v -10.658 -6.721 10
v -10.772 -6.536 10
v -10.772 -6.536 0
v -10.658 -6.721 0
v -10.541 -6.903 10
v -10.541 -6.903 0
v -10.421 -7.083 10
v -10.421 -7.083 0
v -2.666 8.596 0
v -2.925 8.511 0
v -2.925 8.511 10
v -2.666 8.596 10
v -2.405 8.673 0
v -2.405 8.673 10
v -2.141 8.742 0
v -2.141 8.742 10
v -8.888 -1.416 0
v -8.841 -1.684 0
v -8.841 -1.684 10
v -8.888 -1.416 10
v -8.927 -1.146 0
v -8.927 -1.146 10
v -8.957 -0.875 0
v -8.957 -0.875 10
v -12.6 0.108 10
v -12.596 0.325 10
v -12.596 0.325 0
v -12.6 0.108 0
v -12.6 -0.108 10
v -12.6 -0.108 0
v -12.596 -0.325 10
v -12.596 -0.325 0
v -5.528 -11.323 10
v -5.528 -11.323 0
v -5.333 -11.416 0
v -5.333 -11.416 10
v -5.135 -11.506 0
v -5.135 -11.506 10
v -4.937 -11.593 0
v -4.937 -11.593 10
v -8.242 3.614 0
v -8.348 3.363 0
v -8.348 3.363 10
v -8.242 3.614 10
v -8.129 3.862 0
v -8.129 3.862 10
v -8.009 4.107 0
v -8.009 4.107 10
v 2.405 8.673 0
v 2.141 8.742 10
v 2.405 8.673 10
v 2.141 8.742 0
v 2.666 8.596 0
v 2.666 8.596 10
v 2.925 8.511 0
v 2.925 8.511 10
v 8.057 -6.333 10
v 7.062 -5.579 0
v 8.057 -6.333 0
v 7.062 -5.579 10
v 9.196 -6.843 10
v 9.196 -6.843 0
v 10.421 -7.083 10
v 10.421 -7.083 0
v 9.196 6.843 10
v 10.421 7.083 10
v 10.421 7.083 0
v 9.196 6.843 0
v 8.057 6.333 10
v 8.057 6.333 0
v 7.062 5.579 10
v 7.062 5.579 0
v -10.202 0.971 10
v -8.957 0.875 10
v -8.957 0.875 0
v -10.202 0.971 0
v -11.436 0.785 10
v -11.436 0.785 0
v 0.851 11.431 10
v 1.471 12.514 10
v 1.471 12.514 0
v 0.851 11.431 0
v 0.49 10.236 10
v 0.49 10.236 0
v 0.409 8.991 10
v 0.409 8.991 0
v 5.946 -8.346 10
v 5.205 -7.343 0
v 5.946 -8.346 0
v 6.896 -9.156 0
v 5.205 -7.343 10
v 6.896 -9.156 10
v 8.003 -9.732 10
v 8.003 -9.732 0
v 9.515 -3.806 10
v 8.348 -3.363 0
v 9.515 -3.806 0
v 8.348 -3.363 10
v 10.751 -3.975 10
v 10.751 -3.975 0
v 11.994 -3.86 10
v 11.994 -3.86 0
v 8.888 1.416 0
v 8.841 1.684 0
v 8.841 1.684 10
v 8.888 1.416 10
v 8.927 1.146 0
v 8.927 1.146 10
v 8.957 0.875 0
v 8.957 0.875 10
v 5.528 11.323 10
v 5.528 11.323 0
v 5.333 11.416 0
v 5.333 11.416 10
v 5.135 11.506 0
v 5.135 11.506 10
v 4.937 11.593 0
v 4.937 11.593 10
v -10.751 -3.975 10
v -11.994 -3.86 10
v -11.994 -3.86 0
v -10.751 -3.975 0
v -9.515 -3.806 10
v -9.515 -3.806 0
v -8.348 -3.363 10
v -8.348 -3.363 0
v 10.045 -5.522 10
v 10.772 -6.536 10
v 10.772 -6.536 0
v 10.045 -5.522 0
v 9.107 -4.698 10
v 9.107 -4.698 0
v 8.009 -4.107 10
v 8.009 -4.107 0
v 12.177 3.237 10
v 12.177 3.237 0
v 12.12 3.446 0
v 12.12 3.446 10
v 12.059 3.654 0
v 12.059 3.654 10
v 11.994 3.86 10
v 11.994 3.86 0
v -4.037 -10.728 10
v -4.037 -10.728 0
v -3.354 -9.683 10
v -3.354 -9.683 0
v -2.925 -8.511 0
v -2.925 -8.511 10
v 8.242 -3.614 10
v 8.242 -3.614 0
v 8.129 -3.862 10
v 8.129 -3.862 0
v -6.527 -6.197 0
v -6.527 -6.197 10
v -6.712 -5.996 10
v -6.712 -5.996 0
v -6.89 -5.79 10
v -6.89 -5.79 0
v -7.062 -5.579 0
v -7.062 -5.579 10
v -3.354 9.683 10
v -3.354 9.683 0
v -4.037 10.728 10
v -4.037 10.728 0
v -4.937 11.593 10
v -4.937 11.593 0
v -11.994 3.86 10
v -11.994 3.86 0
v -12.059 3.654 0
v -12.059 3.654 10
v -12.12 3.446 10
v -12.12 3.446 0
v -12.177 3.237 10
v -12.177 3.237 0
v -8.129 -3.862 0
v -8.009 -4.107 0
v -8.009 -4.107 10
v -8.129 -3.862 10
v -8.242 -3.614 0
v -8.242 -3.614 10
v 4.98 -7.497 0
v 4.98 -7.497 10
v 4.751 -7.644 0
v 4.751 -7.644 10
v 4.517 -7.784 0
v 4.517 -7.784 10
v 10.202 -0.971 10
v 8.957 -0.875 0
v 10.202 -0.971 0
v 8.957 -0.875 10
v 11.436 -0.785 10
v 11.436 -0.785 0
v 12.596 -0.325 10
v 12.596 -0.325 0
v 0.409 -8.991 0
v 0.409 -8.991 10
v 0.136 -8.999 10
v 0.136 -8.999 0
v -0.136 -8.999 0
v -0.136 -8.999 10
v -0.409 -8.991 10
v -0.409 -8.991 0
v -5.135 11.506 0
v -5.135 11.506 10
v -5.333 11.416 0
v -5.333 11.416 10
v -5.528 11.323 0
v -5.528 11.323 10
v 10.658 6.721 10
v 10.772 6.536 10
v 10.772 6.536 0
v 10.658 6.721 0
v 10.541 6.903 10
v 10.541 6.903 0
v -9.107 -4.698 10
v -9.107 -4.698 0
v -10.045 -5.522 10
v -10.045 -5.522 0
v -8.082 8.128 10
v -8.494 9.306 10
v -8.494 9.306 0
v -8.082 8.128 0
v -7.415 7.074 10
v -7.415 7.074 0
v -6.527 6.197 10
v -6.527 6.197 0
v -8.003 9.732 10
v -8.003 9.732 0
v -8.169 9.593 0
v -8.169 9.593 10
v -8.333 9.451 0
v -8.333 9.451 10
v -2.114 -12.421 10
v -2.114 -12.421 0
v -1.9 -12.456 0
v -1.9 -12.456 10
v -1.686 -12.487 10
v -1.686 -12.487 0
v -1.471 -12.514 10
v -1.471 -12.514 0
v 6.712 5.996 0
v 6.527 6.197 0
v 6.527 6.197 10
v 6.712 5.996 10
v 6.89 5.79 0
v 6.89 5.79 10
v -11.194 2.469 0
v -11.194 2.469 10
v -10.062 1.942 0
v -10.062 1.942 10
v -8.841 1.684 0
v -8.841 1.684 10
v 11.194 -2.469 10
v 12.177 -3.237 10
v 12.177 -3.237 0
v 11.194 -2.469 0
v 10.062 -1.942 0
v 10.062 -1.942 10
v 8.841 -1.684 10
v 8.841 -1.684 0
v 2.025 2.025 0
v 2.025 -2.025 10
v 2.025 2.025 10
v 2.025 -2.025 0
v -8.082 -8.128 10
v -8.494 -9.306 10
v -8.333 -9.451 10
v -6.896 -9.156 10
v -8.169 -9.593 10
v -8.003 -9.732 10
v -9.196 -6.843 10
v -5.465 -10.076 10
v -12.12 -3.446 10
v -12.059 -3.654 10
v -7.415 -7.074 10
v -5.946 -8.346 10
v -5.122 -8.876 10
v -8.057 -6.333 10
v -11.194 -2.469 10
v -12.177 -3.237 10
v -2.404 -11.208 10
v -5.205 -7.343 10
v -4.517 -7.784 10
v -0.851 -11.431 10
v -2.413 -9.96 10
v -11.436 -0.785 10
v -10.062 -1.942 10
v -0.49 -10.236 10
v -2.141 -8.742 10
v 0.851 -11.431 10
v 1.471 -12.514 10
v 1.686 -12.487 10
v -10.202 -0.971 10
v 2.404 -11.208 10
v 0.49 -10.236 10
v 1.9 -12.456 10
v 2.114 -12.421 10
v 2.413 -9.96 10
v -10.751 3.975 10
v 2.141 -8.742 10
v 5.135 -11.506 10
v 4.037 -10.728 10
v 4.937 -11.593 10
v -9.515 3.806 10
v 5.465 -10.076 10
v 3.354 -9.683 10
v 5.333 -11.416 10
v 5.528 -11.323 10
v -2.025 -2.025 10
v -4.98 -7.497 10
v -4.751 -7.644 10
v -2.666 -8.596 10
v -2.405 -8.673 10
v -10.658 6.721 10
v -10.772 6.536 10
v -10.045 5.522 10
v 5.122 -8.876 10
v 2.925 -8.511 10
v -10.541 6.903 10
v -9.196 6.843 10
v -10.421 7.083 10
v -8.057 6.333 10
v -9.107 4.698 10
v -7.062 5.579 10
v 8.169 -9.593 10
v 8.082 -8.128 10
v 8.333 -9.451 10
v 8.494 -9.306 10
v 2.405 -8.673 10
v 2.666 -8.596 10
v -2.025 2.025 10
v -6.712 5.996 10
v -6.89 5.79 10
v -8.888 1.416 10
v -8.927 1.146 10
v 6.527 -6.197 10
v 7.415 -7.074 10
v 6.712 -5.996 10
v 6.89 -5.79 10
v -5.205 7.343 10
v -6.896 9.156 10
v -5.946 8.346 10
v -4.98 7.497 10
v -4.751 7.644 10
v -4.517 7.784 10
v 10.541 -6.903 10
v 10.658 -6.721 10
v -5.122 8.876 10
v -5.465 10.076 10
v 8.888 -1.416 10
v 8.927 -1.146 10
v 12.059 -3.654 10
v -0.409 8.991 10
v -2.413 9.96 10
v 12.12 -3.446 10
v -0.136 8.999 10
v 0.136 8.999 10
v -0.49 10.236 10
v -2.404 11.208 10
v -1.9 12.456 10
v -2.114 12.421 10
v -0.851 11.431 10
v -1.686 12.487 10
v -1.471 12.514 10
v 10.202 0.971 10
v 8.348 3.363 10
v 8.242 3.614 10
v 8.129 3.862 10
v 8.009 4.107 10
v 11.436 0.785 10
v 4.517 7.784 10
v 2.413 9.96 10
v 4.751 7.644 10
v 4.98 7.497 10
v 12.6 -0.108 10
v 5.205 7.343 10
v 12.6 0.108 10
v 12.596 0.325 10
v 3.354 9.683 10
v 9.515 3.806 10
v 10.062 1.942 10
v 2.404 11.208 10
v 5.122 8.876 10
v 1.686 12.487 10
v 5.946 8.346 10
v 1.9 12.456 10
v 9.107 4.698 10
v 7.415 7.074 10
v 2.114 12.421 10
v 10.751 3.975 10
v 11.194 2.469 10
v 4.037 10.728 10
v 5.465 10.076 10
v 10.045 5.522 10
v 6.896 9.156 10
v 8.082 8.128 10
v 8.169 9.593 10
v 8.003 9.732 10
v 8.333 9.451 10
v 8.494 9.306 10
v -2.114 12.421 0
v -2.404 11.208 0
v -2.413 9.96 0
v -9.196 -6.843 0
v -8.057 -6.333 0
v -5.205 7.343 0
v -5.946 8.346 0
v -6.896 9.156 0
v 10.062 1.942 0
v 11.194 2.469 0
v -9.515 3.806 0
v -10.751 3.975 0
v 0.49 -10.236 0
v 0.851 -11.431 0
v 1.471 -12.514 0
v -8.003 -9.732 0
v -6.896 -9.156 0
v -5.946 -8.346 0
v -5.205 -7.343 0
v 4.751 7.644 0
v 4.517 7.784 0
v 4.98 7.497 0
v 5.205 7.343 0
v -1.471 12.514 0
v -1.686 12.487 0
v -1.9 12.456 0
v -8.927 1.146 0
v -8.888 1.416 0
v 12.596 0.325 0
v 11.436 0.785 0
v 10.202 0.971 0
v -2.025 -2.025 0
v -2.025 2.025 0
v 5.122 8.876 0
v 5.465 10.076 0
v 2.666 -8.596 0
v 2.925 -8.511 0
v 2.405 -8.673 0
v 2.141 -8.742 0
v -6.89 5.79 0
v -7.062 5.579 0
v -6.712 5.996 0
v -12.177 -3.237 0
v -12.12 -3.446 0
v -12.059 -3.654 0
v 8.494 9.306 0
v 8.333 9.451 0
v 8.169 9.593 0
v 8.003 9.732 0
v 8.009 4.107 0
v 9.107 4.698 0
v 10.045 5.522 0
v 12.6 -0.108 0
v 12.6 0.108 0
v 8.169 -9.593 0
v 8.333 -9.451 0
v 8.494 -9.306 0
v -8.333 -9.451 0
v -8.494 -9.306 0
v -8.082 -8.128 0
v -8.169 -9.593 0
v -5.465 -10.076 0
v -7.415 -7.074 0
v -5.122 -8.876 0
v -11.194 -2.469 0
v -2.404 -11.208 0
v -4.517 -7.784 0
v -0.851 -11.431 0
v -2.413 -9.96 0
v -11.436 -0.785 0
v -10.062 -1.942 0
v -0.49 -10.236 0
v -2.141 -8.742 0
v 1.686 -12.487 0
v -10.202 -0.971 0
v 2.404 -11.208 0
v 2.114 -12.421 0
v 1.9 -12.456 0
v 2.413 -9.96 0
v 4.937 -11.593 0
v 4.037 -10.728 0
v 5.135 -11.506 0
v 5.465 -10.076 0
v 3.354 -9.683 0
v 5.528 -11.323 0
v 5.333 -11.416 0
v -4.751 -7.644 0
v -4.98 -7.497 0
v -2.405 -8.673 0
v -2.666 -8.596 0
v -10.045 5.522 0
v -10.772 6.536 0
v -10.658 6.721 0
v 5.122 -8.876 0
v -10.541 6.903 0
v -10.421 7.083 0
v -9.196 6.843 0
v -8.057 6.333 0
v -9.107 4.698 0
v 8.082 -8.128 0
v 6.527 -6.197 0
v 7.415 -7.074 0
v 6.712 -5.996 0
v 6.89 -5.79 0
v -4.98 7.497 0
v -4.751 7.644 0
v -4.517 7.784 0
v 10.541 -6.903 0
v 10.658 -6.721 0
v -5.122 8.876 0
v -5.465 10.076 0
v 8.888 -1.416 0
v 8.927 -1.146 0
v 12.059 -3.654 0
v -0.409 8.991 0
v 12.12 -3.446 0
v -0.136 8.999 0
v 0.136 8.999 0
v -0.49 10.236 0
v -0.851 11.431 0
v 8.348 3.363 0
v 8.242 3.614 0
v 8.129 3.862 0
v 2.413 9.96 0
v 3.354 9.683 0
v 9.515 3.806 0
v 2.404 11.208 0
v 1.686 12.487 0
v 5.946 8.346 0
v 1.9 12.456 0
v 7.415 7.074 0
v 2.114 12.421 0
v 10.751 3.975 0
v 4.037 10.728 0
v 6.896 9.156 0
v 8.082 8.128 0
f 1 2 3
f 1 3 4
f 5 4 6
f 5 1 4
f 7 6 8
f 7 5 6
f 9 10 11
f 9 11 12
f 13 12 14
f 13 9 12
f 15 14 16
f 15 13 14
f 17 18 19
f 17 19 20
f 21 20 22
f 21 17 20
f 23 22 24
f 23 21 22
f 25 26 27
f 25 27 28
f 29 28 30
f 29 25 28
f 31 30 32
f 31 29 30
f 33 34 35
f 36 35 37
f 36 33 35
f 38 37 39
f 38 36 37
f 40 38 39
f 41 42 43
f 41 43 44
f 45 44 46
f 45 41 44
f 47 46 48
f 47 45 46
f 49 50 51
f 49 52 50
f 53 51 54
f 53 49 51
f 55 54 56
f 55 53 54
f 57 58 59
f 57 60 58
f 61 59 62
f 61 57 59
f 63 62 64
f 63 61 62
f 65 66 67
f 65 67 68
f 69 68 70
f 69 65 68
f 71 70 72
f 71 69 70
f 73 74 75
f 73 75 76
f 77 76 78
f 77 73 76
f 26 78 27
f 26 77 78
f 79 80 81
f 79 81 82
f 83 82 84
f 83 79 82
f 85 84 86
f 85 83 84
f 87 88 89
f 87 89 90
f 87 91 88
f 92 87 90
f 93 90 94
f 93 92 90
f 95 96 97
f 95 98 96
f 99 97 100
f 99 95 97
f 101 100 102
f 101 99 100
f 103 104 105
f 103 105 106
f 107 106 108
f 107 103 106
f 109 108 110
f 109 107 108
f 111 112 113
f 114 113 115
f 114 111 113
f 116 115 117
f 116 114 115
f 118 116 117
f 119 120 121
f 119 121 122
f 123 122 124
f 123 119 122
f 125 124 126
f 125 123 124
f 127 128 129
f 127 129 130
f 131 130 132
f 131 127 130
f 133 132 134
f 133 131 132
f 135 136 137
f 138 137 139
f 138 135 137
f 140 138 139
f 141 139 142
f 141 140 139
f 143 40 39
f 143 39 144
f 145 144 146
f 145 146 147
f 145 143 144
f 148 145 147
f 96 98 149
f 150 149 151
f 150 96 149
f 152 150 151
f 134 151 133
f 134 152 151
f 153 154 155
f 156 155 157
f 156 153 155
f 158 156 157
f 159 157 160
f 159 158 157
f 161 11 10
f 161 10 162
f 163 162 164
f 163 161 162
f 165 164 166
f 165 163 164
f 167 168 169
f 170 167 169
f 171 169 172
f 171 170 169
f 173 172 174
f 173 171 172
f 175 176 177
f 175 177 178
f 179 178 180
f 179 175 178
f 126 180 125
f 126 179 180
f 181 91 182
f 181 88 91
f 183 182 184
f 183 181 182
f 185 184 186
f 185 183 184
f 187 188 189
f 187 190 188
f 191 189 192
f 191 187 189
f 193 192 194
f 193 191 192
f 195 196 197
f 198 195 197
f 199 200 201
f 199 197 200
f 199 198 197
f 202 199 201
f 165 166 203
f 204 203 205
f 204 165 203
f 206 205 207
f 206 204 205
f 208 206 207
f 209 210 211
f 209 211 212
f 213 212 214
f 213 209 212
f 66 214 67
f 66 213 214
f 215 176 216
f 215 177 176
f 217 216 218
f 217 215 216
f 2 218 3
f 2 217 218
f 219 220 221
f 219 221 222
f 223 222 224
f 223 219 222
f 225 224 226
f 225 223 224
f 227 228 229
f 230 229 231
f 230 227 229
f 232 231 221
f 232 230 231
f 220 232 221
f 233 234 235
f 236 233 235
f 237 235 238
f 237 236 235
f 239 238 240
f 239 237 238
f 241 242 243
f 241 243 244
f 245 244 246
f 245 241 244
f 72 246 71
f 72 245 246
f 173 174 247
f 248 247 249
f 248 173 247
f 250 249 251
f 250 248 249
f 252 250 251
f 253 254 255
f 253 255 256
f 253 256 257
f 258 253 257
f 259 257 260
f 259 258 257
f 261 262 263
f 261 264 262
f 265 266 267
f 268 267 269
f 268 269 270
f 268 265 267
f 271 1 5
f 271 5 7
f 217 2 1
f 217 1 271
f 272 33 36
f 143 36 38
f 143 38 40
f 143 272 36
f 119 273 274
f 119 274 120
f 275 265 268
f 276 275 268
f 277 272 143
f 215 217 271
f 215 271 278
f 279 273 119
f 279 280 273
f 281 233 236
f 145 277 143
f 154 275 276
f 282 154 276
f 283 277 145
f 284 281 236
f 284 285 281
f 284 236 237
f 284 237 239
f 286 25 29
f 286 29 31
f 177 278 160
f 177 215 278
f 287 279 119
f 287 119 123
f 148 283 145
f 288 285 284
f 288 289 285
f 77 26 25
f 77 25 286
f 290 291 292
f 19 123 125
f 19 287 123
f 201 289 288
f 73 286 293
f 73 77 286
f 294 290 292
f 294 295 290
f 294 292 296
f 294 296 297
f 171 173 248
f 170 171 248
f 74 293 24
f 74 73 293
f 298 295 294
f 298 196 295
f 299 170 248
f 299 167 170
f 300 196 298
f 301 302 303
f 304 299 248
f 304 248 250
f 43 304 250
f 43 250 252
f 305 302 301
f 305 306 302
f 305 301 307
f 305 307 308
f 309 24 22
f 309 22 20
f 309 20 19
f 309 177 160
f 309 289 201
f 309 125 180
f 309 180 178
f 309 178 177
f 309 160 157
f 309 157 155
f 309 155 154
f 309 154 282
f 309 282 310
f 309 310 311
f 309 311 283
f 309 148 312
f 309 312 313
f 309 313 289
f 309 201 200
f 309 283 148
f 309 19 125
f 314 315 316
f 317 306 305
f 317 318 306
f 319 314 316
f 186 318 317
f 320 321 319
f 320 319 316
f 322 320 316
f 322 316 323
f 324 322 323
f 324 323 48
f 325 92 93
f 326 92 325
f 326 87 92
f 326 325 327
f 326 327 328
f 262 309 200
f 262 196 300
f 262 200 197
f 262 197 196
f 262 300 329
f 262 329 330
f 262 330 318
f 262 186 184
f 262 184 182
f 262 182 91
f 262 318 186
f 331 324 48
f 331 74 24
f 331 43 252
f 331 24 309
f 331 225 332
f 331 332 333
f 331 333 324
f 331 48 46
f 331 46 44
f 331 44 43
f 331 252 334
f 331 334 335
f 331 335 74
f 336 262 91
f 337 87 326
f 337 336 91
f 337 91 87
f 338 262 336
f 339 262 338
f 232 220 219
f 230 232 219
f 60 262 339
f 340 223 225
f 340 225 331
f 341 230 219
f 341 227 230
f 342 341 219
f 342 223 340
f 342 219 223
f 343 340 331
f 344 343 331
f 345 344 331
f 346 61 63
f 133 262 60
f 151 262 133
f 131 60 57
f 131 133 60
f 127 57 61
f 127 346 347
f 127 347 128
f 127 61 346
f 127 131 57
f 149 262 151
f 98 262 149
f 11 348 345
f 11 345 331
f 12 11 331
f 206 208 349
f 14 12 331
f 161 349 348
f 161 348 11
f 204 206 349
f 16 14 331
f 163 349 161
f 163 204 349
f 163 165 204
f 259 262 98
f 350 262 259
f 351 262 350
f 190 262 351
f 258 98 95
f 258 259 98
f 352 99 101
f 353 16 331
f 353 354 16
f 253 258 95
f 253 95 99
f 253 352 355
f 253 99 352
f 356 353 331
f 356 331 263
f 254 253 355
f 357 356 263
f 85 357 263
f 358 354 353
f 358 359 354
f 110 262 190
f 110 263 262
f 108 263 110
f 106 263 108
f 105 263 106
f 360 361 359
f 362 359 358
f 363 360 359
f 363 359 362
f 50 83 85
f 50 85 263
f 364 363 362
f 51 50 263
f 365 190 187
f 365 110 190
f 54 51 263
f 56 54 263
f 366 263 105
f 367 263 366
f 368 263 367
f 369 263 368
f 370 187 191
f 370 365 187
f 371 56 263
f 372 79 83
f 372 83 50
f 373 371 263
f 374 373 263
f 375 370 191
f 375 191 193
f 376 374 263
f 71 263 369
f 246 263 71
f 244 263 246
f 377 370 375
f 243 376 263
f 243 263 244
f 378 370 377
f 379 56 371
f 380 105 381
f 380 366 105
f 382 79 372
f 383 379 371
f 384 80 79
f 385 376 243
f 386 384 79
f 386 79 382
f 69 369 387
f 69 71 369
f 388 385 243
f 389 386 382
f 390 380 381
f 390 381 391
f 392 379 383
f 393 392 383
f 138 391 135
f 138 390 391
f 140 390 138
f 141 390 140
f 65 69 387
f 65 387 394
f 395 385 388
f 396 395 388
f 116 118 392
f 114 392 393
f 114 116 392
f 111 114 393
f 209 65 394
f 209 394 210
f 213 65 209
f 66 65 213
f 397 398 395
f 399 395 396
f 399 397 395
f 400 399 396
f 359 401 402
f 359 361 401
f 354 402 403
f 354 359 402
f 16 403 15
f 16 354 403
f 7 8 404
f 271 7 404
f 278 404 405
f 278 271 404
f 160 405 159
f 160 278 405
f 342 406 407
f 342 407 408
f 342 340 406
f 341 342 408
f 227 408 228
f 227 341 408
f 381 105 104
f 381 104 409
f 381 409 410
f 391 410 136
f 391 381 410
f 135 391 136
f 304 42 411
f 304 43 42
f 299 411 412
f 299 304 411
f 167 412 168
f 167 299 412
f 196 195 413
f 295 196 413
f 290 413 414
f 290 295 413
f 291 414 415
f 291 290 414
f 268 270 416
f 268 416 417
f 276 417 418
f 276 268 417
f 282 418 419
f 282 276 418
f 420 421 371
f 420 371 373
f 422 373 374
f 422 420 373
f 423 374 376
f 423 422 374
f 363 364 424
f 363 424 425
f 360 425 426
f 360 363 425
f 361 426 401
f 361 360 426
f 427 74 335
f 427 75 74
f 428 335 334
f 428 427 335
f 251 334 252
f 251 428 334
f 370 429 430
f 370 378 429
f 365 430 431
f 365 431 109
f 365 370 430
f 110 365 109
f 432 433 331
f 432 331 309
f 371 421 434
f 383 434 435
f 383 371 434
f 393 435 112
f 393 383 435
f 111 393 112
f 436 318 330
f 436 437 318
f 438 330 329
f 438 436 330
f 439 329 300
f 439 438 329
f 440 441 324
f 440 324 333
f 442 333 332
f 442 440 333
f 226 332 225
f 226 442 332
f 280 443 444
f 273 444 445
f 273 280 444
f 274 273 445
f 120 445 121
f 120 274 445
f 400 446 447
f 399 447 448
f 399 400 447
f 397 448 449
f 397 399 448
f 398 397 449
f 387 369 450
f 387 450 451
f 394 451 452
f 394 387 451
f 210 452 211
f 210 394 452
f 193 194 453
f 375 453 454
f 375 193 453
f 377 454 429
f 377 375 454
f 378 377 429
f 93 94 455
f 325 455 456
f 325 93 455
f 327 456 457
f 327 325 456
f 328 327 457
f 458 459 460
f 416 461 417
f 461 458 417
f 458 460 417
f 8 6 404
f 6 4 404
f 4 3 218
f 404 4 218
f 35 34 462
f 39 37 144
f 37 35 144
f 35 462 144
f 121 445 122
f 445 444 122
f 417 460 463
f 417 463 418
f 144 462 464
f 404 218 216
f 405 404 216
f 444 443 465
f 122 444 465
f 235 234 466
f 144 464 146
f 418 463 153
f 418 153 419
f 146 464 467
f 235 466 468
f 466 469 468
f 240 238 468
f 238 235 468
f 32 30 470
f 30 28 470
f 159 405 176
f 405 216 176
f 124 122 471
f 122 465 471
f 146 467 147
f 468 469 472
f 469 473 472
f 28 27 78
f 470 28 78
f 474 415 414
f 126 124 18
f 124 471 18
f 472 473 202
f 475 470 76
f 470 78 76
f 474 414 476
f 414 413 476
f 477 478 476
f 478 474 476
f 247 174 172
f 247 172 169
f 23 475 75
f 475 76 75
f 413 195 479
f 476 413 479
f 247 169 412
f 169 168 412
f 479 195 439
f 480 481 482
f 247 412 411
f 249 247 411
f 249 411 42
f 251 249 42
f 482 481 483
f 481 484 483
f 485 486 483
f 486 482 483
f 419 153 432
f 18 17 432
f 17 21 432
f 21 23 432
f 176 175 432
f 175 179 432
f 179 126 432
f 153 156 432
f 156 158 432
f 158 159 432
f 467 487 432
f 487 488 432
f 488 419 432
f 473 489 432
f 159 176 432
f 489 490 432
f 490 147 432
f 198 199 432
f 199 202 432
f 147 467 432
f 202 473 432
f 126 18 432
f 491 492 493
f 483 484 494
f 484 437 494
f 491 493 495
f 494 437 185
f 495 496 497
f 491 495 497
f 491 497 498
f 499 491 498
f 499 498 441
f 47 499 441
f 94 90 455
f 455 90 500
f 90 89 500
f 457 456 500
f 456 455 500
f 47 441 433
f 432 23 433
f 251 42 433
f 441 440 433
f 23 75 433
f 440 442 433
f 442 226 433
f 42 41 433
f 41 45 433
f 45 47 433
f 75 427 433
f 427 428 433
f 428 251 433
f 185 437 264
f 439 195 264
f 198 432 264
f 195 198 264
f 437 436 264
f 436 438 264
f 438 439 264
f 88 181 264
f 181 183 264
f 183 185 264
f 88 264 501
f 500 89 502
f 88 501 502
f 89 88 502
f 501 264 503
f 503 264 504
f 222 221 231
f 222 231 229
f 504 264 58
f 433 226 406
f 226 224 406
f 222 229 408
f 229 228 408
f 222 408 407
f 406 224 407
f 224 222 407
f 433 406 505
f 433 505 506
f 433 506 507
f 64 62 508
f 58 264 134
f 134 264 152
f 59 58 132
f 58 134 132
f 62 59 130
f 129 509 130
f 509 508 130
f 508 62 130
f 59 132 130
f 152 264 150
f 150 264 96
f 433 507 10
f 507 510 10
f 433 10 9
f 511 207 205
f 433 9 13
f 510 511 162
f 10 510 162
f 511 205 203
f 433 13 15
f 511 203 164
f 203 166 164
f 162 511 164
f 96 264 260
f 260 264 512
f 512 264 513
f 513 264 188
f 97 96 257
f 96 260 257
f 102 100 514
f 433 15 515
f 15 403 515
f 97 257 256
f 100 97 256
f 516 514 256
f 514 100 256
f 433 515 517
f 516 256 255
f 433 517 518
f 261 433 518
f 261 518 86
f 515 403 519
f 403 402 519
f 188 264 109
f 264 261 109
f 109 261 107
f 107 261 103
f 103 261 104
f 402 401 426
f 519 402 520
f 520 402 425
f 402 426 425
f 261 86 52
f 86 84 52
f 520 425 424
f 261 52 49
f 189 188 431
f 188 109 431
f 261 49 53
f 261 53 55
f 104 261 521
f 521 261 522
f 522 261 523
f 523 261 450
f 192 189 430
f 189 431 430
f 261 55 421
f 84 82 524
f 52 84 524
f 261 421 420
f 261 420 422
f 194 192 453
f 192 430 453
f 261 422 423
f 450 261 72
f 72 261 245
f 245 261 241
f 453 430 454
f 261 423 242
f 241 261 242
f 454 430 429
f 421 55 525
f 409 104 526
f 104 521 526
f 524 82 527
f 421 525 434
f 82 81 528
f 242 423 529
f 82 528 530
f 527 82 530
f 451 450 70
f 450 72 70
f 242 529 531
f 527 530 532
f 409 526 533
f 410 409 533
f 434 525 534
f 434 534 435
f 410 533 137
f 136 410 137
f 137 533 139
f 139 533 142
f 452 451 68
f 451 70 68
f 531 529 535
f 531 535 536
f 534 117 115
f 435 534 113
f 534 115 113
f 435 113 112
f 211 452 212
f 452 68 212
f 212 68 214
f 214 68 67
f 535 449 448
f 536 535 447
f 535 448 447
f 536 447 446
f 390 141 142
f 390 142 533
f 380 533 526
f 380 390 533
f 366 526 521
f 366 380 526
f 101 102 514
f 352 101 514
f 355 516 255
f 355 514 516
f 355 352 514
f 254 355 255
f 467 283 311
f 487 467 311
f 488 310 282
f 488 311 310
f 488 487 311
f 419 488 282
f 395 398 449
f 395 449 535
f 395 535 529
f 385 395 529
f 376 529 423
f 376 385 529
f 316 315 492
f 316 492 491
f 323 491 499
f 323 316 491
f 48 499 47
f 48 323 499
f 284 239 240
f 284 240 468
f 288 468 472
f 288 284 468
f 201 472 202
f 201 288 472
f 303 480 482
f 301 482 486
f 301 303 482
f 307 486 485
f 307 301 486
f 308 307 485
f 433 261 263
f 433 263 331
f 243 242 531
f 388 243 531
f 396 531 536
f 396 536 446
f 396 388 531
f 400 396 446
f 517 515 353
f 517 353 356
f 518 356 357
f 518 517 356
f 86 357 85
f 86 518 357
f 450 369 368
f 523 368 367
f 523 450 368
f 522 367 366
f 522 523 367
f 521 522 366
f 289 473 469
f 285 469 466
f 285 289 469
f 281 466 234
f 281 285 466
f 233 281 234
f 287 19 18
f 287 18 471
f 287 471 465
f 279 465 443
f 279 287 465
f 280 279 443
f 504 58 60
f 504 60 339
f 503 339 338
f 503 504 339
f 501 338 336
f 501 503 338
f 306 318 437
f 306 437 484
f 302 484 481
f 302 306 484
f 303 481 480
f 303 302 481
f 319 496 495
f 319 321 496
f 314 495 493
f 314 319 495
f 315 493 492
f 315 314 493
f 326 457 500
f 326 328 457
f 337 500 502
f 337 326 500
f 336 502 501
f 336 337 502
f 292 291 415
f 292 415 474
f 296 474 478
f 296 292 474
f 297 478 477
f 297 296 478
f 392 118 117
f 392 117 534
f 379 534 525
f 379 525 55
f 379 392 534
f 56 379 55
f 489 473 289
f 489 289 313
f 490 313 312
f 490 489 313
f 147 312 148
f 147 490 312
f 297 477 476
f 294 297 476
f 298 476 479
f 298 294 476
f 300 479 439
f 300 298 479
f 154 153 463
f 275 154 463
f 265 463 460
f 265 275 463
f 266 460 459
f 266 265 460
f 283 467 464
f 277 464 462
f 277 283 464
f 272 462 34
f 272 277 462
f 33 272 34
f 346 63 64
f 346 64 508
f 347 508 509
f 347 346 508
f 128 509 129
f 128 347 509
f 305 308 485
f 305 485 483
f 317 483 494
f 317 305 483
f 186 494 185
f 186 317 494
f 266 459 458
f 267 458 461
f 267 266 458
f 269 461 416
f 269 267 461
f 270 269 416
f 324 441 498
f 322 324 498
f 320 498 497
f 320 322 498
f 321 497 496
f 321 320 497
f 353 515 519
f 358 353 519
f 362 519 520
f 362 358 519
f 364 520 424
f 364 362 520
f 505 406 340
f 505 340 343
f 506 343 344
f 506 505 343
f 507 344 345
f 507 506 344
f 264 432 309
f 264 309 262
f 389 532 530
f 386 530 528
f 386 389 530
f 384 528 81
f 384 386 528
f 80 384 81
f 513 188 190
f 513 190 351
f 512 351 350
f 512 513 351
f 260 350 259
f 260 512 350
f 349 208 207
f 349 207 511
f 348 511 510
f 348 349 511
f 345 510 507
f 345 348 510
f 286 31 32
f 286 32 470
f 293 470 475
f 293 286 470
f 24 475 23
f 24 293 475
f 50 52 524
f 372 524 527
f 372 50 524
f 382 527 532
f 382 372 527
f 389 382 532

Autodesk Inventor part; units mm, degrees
ref_plane "YZ Plane" through (0, 0, 0) normal (1, 0, 0) x (0, 1, 0)
ref_plane "XZ Plane" through (0, 0, 0) normal (0, 1, 0) x (-1, 0, 0)
ref_plane "XY Plane" through (0, 0, 0) normal (0, 0, 1) x (1, 0, 0)
sketch "Sketch1" plane through (0, 0, 0) normal (0, 0, 1) x (1, 0, 0)
  circle A0 centre (0, 0) radius 12.5
  circle A1 centre (0, 0) radius 9
  line L0 (-12.5, 0) -> (12.5, 0)
  line L1 (-2.025, -2.025) -> (2.025, -2.025)
  line L2 (2.025, -2.025) -> (2.025, 2.025)
  line L3 (2.025, 2.025) -> (-2.025, 2.025)
  line L4 (-2.025, 2.025) -> (-2.025, -2.025)
  line L5 (-2.025, -2.025) -> (2.025, 2.025) construction
  line L6 (2.025, -2.025) -> (-2.025, 2.025) construction
  dimension "d0" = 25
  dimension "d1" = 18
  dimension "d7" = 4.05
extrude "Extrusion1" add sketch "Sketch1" along normal blind 10 contours L0 L2 L3 L4 A1 | A1 L0 L4 L1 L2
sketch "Sketch2" plane through (0, 0, 10) normal (0, 0, 1) x (1, 0, 0)
  line L0 (0, 0) -> (9, 0)
  circle A0 centre (0, 0) radius 9 projected
  circle A1 centre (0, 0) radius 12.6
  arc A2 (12.5958, 0.325) -> (8.9574, 0.875) centre (10.0019, -4.5249) ccw
  arc A3 (8.9574, -0.875) -> (12.5958, -0.325) centre (10.0019, 4.5249) ccw
  point P0 (8.9574, -0.875)
  point P1 (12.5958, -0.325)
  dimension "d17" = 25.2
  dimension "d26" = 0.65
  dimension "d27" = 1.75
  dimension "d28" = 5.5
extrude "Extrusion2" add sketch "Sketch2" against normal blind 10 contours A0 A2 A1 A3 picked at (10.613, 0.2616)
pattern_circular "Circular Pattern1" count 22 over 360 about axis through (0, 0, -10) along (0, 0, 1) of "Extrusion2"
properties part number "Pinion Gear FV"
